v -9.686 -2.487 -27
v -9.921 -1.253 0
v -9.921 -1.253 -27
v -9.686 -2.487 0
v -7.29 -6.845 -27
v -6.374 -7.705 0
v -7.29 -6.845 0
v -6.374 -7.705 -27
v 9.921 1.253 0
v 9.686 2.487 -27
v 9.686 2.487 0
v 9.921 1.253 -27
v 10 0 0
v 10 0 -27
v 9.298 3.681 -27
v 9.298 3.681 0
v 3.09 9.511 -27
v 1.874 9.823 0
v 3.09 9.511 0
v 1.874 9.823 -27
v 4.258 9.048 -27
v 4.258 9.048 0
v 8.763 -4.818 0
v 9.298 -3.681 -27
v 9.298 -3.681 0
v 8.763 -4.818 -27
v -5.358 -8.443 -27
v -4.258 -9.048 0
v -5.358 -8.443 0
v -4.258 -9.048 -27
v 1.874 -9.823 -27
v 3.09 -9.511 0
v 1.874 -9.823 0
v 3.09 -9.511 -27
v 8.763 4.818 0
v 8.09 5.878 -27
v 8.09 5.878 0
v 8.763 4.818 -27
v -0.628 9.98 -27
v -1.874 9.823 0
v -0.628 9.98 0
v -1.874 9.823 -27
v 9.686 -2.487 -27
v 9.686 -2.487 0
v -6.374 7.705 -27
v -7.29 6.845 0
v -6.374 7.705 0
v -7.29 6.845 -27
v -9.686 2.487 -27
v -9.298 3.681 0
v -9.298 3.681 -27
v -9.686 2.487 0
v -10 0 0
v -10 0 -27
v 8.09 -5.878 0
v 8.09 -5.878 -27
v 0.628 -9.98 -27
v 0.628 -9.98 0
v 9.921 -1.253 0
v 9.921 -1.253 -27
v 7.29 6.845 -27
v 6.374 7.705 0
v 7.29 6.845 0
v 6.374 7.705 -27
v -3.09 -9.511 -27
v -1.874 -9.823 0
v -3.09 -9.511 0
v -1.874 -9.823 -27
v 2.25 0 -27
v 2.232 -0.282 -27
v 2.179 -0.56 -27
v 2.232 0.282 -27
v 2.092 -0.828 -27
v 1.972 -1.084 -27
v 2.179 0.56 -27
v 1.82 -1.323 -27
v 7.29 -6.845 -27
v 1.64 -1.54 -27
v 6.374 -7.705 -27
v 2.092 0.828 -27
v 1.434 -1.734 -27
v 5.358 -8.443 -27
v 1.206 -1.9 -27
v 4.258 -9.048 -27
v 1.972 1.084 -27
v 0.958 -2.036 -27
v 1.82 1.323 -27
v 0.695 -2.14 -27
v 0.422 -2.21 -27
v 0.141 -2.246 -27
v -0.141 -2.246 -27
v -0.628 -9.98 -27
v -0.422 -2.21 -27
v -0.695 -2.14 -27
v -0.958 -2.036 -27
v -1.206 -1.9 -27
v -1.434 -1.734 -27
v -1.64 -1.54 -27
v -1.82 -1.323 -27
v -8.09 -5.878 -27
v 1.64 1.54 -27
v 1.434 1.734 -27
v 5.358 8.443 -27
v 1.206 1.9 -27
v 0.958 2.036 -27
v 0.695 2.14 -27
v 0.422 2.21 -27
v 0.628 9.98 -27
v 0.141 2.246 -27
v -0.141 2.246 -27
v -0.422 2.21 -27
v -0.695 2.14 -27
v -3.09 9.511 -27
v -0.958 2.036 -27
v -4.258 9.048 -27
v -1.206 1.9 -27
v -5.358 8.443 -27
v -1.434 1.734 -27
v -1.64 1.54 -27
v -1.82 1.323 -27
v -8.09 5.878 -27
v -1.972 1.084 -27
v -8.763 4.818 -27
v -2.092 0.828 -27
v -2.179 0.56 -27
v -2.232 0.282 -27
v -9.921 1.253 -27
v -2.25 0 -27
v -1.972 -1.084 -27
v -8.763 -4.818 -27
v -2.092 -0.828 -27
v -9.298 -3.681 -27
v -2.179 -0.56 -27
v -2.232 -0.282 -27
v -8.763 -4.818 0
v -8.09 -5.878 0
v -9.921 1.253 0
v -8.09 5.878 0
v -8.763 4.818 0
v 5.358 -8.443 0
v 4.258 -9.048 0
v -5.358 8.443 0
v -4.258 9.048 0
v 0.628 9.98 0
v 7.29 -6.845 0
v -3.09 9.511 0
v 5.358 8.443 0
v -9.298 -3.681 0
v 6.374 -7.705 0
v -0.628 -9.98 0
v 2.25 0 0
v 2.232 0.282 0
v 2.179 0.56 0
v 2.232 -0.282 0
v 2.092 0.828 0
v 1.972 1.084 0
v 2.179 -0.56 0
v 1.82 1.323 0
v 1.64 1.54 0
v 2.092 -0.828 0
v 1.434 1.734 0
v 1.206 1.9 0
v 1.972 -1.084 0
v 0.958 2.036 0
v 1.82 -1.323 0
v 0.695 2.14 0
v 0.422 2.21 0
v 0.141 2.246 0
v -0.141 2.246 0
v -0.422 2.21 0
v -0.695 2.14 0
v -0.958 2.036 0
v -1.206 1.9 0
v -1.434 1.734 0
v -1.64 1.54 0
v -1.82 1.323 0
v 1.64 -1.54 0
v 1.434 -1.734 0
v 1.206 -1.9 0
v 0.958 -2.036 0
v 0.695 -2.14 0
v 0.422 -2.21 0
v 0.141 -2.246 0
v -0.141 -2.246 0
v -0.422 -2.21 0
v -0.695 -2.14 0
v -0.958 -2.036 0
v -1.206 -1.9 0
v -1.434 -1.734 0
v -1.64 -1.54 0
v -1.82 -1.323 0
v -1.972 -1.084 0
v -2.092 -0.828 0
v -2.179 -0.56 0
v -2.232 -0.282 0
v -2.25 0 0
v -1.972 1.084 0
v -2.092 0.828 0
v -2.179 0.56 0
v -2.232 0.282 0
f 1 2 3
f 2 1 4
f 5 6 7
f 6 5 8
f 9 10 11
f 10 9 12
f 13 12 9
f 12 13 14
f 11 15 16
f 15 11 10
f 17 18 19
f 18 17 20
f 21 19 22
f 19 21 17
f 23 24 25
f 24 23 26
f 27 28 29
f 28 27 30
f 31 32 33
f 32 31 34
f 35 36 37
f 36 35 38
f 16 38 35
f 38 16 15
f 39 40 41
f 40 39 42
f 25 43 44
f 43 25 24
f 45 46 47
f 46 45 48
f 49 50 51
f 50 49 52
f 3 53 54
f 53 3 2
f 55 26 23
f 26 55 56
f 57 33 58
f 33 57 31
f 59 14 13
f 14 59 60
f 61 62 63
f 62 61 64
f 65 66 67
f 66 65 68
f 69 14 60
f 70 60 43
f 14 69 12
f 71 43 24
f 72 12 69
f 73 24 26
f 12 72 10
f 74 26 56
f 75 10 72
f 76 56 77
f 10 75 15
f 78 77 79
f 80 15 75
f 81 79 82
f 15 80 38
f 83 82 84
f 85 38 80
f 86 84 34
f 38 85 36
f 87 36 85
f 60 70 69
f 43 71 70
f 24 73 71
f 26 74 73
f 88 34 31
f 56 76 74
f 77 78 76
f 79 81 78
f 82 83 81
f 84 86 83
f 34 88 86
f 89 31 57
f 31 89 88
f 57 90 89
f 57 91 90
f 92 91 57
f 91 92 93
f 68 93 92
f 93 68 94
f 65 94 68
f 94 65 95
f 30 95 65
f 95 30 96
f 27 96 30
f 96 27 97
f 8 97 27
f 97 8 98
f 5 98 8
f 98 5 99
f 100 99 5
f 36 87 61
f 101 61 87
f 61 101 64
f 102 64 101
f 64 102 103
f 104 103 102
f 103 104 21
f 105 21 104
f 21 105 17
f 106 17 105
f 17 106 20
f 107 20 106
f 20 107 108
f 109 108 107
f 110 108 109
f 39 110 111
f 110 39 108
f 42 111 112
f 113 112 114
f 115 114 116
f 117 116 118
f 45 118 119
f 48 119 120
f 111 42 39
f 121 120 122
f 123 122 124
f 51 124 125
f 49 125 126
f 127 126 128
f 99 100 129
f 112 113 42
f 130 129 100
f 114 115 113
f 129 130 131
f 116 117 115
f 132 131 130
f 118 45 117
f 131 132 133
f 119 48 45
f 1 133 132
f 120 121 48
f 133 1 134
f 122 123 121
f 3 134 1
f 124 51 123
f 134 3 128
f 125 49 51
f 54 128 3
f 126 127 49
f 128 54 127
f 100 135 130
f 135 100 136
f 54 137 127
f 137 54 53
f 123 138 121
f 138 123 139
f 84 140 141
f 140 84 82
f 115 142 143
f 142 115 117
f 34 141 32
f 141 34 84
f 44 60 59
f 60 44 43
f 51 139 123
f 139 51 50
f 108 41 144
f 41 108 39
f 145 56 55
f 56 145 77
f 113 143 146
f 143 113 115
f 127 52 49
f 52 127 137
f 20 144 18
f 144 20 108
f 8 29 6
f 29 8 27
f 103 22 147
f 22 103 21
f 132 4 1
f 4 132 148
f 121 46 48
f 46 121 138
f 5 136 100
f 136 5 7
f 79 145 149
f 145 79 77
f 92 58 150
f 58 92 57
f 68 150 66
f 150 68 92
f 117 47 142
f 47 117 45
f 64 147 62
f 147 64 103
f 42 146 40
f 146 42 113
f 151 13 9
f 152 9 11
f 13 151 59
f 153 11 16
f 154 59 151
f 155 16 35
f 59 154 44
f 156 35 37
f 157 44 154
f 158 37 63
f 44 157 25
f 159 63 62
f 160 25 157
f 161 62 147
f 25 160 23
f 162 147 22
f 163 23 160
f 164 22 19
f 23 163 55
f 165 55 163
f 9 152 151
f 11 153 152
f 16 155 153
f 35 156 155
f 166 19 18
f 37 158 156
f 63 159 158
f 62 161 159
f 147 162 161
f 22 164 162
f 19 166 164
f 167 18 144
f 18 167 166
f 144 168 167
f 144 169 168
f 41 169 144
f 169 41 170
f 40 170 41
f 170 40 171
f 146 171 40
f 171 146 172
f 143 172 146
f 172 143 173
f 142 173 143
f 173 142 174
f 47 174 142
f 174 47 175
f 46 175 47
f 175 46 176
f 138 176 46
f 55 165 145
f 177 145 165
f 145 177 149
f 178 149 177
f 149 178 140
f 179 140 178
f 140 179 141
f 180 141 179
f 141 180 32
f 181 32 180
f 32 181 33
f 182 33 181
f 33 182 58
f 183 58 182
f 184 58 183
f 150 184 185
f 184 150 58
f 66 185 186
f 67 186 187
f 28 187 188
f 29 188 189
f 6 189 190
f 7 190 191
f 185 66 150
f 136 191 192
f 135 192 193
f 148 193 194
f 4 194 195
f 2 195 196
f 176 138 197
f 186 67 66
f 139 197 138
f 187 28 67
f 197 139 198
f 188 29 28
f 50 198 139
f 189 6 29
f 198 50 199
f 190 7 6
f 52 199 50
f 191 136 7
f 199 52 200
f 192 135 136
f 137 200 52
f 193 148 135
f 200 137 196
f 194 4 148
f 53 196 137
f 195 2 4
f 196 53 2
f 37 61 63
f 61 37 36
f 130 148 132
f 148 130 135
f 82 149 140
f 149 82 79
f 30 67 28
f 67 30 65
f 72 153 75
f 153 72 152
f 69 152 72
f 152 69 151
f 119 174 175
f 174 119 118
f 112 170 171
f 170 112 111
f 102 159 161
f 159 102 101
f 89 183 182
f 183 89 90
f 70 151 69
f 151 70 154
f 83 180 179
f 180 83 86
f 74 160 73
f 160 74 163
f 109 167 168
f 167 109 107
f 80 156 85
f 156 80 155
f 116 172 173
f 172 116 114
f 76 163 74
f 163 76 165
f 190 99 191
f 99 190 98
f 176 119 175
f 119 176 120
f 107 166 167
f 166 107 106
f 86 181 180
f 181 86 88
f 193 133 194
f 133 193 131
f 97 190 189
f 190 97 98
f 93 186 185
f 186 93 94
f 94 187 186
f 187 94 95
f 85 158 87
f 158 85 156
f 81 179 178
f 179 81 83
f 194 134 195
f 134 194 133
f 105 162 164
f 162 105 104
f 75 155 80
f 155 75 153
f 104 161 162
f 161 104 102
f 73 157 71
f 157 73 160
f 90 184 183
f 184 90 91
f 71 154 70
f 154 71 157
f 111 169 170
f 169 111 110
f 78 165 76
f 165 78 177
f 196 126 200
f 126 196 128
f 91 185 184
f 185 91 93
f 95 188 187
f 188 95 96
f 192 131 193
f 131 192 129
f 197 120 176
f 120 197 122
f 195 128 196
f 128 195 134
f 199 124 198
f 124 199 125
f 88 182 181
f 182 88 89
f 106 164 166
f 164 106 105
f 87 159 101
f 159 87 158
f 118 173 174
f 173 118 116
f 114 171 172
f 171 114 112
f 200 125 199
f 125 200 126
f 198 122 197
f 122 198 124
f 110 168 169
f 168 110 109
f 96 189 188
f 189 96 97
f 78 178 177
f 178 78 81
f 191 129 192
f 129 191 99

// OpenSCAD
$fn = 50;


difference() {
	union() {
		translate(v = [0, 0, -27.0000000000]) {
			cylinder(h = 27, r = 10.0000000000);
		}
		cylinder(h = 0, r = 13.0000000000);
	}
	union() {
		#translate(v = [0, 0, -27]) {
			cylinder(h = 27, r = 2.2500000000);
		}
	}
}
